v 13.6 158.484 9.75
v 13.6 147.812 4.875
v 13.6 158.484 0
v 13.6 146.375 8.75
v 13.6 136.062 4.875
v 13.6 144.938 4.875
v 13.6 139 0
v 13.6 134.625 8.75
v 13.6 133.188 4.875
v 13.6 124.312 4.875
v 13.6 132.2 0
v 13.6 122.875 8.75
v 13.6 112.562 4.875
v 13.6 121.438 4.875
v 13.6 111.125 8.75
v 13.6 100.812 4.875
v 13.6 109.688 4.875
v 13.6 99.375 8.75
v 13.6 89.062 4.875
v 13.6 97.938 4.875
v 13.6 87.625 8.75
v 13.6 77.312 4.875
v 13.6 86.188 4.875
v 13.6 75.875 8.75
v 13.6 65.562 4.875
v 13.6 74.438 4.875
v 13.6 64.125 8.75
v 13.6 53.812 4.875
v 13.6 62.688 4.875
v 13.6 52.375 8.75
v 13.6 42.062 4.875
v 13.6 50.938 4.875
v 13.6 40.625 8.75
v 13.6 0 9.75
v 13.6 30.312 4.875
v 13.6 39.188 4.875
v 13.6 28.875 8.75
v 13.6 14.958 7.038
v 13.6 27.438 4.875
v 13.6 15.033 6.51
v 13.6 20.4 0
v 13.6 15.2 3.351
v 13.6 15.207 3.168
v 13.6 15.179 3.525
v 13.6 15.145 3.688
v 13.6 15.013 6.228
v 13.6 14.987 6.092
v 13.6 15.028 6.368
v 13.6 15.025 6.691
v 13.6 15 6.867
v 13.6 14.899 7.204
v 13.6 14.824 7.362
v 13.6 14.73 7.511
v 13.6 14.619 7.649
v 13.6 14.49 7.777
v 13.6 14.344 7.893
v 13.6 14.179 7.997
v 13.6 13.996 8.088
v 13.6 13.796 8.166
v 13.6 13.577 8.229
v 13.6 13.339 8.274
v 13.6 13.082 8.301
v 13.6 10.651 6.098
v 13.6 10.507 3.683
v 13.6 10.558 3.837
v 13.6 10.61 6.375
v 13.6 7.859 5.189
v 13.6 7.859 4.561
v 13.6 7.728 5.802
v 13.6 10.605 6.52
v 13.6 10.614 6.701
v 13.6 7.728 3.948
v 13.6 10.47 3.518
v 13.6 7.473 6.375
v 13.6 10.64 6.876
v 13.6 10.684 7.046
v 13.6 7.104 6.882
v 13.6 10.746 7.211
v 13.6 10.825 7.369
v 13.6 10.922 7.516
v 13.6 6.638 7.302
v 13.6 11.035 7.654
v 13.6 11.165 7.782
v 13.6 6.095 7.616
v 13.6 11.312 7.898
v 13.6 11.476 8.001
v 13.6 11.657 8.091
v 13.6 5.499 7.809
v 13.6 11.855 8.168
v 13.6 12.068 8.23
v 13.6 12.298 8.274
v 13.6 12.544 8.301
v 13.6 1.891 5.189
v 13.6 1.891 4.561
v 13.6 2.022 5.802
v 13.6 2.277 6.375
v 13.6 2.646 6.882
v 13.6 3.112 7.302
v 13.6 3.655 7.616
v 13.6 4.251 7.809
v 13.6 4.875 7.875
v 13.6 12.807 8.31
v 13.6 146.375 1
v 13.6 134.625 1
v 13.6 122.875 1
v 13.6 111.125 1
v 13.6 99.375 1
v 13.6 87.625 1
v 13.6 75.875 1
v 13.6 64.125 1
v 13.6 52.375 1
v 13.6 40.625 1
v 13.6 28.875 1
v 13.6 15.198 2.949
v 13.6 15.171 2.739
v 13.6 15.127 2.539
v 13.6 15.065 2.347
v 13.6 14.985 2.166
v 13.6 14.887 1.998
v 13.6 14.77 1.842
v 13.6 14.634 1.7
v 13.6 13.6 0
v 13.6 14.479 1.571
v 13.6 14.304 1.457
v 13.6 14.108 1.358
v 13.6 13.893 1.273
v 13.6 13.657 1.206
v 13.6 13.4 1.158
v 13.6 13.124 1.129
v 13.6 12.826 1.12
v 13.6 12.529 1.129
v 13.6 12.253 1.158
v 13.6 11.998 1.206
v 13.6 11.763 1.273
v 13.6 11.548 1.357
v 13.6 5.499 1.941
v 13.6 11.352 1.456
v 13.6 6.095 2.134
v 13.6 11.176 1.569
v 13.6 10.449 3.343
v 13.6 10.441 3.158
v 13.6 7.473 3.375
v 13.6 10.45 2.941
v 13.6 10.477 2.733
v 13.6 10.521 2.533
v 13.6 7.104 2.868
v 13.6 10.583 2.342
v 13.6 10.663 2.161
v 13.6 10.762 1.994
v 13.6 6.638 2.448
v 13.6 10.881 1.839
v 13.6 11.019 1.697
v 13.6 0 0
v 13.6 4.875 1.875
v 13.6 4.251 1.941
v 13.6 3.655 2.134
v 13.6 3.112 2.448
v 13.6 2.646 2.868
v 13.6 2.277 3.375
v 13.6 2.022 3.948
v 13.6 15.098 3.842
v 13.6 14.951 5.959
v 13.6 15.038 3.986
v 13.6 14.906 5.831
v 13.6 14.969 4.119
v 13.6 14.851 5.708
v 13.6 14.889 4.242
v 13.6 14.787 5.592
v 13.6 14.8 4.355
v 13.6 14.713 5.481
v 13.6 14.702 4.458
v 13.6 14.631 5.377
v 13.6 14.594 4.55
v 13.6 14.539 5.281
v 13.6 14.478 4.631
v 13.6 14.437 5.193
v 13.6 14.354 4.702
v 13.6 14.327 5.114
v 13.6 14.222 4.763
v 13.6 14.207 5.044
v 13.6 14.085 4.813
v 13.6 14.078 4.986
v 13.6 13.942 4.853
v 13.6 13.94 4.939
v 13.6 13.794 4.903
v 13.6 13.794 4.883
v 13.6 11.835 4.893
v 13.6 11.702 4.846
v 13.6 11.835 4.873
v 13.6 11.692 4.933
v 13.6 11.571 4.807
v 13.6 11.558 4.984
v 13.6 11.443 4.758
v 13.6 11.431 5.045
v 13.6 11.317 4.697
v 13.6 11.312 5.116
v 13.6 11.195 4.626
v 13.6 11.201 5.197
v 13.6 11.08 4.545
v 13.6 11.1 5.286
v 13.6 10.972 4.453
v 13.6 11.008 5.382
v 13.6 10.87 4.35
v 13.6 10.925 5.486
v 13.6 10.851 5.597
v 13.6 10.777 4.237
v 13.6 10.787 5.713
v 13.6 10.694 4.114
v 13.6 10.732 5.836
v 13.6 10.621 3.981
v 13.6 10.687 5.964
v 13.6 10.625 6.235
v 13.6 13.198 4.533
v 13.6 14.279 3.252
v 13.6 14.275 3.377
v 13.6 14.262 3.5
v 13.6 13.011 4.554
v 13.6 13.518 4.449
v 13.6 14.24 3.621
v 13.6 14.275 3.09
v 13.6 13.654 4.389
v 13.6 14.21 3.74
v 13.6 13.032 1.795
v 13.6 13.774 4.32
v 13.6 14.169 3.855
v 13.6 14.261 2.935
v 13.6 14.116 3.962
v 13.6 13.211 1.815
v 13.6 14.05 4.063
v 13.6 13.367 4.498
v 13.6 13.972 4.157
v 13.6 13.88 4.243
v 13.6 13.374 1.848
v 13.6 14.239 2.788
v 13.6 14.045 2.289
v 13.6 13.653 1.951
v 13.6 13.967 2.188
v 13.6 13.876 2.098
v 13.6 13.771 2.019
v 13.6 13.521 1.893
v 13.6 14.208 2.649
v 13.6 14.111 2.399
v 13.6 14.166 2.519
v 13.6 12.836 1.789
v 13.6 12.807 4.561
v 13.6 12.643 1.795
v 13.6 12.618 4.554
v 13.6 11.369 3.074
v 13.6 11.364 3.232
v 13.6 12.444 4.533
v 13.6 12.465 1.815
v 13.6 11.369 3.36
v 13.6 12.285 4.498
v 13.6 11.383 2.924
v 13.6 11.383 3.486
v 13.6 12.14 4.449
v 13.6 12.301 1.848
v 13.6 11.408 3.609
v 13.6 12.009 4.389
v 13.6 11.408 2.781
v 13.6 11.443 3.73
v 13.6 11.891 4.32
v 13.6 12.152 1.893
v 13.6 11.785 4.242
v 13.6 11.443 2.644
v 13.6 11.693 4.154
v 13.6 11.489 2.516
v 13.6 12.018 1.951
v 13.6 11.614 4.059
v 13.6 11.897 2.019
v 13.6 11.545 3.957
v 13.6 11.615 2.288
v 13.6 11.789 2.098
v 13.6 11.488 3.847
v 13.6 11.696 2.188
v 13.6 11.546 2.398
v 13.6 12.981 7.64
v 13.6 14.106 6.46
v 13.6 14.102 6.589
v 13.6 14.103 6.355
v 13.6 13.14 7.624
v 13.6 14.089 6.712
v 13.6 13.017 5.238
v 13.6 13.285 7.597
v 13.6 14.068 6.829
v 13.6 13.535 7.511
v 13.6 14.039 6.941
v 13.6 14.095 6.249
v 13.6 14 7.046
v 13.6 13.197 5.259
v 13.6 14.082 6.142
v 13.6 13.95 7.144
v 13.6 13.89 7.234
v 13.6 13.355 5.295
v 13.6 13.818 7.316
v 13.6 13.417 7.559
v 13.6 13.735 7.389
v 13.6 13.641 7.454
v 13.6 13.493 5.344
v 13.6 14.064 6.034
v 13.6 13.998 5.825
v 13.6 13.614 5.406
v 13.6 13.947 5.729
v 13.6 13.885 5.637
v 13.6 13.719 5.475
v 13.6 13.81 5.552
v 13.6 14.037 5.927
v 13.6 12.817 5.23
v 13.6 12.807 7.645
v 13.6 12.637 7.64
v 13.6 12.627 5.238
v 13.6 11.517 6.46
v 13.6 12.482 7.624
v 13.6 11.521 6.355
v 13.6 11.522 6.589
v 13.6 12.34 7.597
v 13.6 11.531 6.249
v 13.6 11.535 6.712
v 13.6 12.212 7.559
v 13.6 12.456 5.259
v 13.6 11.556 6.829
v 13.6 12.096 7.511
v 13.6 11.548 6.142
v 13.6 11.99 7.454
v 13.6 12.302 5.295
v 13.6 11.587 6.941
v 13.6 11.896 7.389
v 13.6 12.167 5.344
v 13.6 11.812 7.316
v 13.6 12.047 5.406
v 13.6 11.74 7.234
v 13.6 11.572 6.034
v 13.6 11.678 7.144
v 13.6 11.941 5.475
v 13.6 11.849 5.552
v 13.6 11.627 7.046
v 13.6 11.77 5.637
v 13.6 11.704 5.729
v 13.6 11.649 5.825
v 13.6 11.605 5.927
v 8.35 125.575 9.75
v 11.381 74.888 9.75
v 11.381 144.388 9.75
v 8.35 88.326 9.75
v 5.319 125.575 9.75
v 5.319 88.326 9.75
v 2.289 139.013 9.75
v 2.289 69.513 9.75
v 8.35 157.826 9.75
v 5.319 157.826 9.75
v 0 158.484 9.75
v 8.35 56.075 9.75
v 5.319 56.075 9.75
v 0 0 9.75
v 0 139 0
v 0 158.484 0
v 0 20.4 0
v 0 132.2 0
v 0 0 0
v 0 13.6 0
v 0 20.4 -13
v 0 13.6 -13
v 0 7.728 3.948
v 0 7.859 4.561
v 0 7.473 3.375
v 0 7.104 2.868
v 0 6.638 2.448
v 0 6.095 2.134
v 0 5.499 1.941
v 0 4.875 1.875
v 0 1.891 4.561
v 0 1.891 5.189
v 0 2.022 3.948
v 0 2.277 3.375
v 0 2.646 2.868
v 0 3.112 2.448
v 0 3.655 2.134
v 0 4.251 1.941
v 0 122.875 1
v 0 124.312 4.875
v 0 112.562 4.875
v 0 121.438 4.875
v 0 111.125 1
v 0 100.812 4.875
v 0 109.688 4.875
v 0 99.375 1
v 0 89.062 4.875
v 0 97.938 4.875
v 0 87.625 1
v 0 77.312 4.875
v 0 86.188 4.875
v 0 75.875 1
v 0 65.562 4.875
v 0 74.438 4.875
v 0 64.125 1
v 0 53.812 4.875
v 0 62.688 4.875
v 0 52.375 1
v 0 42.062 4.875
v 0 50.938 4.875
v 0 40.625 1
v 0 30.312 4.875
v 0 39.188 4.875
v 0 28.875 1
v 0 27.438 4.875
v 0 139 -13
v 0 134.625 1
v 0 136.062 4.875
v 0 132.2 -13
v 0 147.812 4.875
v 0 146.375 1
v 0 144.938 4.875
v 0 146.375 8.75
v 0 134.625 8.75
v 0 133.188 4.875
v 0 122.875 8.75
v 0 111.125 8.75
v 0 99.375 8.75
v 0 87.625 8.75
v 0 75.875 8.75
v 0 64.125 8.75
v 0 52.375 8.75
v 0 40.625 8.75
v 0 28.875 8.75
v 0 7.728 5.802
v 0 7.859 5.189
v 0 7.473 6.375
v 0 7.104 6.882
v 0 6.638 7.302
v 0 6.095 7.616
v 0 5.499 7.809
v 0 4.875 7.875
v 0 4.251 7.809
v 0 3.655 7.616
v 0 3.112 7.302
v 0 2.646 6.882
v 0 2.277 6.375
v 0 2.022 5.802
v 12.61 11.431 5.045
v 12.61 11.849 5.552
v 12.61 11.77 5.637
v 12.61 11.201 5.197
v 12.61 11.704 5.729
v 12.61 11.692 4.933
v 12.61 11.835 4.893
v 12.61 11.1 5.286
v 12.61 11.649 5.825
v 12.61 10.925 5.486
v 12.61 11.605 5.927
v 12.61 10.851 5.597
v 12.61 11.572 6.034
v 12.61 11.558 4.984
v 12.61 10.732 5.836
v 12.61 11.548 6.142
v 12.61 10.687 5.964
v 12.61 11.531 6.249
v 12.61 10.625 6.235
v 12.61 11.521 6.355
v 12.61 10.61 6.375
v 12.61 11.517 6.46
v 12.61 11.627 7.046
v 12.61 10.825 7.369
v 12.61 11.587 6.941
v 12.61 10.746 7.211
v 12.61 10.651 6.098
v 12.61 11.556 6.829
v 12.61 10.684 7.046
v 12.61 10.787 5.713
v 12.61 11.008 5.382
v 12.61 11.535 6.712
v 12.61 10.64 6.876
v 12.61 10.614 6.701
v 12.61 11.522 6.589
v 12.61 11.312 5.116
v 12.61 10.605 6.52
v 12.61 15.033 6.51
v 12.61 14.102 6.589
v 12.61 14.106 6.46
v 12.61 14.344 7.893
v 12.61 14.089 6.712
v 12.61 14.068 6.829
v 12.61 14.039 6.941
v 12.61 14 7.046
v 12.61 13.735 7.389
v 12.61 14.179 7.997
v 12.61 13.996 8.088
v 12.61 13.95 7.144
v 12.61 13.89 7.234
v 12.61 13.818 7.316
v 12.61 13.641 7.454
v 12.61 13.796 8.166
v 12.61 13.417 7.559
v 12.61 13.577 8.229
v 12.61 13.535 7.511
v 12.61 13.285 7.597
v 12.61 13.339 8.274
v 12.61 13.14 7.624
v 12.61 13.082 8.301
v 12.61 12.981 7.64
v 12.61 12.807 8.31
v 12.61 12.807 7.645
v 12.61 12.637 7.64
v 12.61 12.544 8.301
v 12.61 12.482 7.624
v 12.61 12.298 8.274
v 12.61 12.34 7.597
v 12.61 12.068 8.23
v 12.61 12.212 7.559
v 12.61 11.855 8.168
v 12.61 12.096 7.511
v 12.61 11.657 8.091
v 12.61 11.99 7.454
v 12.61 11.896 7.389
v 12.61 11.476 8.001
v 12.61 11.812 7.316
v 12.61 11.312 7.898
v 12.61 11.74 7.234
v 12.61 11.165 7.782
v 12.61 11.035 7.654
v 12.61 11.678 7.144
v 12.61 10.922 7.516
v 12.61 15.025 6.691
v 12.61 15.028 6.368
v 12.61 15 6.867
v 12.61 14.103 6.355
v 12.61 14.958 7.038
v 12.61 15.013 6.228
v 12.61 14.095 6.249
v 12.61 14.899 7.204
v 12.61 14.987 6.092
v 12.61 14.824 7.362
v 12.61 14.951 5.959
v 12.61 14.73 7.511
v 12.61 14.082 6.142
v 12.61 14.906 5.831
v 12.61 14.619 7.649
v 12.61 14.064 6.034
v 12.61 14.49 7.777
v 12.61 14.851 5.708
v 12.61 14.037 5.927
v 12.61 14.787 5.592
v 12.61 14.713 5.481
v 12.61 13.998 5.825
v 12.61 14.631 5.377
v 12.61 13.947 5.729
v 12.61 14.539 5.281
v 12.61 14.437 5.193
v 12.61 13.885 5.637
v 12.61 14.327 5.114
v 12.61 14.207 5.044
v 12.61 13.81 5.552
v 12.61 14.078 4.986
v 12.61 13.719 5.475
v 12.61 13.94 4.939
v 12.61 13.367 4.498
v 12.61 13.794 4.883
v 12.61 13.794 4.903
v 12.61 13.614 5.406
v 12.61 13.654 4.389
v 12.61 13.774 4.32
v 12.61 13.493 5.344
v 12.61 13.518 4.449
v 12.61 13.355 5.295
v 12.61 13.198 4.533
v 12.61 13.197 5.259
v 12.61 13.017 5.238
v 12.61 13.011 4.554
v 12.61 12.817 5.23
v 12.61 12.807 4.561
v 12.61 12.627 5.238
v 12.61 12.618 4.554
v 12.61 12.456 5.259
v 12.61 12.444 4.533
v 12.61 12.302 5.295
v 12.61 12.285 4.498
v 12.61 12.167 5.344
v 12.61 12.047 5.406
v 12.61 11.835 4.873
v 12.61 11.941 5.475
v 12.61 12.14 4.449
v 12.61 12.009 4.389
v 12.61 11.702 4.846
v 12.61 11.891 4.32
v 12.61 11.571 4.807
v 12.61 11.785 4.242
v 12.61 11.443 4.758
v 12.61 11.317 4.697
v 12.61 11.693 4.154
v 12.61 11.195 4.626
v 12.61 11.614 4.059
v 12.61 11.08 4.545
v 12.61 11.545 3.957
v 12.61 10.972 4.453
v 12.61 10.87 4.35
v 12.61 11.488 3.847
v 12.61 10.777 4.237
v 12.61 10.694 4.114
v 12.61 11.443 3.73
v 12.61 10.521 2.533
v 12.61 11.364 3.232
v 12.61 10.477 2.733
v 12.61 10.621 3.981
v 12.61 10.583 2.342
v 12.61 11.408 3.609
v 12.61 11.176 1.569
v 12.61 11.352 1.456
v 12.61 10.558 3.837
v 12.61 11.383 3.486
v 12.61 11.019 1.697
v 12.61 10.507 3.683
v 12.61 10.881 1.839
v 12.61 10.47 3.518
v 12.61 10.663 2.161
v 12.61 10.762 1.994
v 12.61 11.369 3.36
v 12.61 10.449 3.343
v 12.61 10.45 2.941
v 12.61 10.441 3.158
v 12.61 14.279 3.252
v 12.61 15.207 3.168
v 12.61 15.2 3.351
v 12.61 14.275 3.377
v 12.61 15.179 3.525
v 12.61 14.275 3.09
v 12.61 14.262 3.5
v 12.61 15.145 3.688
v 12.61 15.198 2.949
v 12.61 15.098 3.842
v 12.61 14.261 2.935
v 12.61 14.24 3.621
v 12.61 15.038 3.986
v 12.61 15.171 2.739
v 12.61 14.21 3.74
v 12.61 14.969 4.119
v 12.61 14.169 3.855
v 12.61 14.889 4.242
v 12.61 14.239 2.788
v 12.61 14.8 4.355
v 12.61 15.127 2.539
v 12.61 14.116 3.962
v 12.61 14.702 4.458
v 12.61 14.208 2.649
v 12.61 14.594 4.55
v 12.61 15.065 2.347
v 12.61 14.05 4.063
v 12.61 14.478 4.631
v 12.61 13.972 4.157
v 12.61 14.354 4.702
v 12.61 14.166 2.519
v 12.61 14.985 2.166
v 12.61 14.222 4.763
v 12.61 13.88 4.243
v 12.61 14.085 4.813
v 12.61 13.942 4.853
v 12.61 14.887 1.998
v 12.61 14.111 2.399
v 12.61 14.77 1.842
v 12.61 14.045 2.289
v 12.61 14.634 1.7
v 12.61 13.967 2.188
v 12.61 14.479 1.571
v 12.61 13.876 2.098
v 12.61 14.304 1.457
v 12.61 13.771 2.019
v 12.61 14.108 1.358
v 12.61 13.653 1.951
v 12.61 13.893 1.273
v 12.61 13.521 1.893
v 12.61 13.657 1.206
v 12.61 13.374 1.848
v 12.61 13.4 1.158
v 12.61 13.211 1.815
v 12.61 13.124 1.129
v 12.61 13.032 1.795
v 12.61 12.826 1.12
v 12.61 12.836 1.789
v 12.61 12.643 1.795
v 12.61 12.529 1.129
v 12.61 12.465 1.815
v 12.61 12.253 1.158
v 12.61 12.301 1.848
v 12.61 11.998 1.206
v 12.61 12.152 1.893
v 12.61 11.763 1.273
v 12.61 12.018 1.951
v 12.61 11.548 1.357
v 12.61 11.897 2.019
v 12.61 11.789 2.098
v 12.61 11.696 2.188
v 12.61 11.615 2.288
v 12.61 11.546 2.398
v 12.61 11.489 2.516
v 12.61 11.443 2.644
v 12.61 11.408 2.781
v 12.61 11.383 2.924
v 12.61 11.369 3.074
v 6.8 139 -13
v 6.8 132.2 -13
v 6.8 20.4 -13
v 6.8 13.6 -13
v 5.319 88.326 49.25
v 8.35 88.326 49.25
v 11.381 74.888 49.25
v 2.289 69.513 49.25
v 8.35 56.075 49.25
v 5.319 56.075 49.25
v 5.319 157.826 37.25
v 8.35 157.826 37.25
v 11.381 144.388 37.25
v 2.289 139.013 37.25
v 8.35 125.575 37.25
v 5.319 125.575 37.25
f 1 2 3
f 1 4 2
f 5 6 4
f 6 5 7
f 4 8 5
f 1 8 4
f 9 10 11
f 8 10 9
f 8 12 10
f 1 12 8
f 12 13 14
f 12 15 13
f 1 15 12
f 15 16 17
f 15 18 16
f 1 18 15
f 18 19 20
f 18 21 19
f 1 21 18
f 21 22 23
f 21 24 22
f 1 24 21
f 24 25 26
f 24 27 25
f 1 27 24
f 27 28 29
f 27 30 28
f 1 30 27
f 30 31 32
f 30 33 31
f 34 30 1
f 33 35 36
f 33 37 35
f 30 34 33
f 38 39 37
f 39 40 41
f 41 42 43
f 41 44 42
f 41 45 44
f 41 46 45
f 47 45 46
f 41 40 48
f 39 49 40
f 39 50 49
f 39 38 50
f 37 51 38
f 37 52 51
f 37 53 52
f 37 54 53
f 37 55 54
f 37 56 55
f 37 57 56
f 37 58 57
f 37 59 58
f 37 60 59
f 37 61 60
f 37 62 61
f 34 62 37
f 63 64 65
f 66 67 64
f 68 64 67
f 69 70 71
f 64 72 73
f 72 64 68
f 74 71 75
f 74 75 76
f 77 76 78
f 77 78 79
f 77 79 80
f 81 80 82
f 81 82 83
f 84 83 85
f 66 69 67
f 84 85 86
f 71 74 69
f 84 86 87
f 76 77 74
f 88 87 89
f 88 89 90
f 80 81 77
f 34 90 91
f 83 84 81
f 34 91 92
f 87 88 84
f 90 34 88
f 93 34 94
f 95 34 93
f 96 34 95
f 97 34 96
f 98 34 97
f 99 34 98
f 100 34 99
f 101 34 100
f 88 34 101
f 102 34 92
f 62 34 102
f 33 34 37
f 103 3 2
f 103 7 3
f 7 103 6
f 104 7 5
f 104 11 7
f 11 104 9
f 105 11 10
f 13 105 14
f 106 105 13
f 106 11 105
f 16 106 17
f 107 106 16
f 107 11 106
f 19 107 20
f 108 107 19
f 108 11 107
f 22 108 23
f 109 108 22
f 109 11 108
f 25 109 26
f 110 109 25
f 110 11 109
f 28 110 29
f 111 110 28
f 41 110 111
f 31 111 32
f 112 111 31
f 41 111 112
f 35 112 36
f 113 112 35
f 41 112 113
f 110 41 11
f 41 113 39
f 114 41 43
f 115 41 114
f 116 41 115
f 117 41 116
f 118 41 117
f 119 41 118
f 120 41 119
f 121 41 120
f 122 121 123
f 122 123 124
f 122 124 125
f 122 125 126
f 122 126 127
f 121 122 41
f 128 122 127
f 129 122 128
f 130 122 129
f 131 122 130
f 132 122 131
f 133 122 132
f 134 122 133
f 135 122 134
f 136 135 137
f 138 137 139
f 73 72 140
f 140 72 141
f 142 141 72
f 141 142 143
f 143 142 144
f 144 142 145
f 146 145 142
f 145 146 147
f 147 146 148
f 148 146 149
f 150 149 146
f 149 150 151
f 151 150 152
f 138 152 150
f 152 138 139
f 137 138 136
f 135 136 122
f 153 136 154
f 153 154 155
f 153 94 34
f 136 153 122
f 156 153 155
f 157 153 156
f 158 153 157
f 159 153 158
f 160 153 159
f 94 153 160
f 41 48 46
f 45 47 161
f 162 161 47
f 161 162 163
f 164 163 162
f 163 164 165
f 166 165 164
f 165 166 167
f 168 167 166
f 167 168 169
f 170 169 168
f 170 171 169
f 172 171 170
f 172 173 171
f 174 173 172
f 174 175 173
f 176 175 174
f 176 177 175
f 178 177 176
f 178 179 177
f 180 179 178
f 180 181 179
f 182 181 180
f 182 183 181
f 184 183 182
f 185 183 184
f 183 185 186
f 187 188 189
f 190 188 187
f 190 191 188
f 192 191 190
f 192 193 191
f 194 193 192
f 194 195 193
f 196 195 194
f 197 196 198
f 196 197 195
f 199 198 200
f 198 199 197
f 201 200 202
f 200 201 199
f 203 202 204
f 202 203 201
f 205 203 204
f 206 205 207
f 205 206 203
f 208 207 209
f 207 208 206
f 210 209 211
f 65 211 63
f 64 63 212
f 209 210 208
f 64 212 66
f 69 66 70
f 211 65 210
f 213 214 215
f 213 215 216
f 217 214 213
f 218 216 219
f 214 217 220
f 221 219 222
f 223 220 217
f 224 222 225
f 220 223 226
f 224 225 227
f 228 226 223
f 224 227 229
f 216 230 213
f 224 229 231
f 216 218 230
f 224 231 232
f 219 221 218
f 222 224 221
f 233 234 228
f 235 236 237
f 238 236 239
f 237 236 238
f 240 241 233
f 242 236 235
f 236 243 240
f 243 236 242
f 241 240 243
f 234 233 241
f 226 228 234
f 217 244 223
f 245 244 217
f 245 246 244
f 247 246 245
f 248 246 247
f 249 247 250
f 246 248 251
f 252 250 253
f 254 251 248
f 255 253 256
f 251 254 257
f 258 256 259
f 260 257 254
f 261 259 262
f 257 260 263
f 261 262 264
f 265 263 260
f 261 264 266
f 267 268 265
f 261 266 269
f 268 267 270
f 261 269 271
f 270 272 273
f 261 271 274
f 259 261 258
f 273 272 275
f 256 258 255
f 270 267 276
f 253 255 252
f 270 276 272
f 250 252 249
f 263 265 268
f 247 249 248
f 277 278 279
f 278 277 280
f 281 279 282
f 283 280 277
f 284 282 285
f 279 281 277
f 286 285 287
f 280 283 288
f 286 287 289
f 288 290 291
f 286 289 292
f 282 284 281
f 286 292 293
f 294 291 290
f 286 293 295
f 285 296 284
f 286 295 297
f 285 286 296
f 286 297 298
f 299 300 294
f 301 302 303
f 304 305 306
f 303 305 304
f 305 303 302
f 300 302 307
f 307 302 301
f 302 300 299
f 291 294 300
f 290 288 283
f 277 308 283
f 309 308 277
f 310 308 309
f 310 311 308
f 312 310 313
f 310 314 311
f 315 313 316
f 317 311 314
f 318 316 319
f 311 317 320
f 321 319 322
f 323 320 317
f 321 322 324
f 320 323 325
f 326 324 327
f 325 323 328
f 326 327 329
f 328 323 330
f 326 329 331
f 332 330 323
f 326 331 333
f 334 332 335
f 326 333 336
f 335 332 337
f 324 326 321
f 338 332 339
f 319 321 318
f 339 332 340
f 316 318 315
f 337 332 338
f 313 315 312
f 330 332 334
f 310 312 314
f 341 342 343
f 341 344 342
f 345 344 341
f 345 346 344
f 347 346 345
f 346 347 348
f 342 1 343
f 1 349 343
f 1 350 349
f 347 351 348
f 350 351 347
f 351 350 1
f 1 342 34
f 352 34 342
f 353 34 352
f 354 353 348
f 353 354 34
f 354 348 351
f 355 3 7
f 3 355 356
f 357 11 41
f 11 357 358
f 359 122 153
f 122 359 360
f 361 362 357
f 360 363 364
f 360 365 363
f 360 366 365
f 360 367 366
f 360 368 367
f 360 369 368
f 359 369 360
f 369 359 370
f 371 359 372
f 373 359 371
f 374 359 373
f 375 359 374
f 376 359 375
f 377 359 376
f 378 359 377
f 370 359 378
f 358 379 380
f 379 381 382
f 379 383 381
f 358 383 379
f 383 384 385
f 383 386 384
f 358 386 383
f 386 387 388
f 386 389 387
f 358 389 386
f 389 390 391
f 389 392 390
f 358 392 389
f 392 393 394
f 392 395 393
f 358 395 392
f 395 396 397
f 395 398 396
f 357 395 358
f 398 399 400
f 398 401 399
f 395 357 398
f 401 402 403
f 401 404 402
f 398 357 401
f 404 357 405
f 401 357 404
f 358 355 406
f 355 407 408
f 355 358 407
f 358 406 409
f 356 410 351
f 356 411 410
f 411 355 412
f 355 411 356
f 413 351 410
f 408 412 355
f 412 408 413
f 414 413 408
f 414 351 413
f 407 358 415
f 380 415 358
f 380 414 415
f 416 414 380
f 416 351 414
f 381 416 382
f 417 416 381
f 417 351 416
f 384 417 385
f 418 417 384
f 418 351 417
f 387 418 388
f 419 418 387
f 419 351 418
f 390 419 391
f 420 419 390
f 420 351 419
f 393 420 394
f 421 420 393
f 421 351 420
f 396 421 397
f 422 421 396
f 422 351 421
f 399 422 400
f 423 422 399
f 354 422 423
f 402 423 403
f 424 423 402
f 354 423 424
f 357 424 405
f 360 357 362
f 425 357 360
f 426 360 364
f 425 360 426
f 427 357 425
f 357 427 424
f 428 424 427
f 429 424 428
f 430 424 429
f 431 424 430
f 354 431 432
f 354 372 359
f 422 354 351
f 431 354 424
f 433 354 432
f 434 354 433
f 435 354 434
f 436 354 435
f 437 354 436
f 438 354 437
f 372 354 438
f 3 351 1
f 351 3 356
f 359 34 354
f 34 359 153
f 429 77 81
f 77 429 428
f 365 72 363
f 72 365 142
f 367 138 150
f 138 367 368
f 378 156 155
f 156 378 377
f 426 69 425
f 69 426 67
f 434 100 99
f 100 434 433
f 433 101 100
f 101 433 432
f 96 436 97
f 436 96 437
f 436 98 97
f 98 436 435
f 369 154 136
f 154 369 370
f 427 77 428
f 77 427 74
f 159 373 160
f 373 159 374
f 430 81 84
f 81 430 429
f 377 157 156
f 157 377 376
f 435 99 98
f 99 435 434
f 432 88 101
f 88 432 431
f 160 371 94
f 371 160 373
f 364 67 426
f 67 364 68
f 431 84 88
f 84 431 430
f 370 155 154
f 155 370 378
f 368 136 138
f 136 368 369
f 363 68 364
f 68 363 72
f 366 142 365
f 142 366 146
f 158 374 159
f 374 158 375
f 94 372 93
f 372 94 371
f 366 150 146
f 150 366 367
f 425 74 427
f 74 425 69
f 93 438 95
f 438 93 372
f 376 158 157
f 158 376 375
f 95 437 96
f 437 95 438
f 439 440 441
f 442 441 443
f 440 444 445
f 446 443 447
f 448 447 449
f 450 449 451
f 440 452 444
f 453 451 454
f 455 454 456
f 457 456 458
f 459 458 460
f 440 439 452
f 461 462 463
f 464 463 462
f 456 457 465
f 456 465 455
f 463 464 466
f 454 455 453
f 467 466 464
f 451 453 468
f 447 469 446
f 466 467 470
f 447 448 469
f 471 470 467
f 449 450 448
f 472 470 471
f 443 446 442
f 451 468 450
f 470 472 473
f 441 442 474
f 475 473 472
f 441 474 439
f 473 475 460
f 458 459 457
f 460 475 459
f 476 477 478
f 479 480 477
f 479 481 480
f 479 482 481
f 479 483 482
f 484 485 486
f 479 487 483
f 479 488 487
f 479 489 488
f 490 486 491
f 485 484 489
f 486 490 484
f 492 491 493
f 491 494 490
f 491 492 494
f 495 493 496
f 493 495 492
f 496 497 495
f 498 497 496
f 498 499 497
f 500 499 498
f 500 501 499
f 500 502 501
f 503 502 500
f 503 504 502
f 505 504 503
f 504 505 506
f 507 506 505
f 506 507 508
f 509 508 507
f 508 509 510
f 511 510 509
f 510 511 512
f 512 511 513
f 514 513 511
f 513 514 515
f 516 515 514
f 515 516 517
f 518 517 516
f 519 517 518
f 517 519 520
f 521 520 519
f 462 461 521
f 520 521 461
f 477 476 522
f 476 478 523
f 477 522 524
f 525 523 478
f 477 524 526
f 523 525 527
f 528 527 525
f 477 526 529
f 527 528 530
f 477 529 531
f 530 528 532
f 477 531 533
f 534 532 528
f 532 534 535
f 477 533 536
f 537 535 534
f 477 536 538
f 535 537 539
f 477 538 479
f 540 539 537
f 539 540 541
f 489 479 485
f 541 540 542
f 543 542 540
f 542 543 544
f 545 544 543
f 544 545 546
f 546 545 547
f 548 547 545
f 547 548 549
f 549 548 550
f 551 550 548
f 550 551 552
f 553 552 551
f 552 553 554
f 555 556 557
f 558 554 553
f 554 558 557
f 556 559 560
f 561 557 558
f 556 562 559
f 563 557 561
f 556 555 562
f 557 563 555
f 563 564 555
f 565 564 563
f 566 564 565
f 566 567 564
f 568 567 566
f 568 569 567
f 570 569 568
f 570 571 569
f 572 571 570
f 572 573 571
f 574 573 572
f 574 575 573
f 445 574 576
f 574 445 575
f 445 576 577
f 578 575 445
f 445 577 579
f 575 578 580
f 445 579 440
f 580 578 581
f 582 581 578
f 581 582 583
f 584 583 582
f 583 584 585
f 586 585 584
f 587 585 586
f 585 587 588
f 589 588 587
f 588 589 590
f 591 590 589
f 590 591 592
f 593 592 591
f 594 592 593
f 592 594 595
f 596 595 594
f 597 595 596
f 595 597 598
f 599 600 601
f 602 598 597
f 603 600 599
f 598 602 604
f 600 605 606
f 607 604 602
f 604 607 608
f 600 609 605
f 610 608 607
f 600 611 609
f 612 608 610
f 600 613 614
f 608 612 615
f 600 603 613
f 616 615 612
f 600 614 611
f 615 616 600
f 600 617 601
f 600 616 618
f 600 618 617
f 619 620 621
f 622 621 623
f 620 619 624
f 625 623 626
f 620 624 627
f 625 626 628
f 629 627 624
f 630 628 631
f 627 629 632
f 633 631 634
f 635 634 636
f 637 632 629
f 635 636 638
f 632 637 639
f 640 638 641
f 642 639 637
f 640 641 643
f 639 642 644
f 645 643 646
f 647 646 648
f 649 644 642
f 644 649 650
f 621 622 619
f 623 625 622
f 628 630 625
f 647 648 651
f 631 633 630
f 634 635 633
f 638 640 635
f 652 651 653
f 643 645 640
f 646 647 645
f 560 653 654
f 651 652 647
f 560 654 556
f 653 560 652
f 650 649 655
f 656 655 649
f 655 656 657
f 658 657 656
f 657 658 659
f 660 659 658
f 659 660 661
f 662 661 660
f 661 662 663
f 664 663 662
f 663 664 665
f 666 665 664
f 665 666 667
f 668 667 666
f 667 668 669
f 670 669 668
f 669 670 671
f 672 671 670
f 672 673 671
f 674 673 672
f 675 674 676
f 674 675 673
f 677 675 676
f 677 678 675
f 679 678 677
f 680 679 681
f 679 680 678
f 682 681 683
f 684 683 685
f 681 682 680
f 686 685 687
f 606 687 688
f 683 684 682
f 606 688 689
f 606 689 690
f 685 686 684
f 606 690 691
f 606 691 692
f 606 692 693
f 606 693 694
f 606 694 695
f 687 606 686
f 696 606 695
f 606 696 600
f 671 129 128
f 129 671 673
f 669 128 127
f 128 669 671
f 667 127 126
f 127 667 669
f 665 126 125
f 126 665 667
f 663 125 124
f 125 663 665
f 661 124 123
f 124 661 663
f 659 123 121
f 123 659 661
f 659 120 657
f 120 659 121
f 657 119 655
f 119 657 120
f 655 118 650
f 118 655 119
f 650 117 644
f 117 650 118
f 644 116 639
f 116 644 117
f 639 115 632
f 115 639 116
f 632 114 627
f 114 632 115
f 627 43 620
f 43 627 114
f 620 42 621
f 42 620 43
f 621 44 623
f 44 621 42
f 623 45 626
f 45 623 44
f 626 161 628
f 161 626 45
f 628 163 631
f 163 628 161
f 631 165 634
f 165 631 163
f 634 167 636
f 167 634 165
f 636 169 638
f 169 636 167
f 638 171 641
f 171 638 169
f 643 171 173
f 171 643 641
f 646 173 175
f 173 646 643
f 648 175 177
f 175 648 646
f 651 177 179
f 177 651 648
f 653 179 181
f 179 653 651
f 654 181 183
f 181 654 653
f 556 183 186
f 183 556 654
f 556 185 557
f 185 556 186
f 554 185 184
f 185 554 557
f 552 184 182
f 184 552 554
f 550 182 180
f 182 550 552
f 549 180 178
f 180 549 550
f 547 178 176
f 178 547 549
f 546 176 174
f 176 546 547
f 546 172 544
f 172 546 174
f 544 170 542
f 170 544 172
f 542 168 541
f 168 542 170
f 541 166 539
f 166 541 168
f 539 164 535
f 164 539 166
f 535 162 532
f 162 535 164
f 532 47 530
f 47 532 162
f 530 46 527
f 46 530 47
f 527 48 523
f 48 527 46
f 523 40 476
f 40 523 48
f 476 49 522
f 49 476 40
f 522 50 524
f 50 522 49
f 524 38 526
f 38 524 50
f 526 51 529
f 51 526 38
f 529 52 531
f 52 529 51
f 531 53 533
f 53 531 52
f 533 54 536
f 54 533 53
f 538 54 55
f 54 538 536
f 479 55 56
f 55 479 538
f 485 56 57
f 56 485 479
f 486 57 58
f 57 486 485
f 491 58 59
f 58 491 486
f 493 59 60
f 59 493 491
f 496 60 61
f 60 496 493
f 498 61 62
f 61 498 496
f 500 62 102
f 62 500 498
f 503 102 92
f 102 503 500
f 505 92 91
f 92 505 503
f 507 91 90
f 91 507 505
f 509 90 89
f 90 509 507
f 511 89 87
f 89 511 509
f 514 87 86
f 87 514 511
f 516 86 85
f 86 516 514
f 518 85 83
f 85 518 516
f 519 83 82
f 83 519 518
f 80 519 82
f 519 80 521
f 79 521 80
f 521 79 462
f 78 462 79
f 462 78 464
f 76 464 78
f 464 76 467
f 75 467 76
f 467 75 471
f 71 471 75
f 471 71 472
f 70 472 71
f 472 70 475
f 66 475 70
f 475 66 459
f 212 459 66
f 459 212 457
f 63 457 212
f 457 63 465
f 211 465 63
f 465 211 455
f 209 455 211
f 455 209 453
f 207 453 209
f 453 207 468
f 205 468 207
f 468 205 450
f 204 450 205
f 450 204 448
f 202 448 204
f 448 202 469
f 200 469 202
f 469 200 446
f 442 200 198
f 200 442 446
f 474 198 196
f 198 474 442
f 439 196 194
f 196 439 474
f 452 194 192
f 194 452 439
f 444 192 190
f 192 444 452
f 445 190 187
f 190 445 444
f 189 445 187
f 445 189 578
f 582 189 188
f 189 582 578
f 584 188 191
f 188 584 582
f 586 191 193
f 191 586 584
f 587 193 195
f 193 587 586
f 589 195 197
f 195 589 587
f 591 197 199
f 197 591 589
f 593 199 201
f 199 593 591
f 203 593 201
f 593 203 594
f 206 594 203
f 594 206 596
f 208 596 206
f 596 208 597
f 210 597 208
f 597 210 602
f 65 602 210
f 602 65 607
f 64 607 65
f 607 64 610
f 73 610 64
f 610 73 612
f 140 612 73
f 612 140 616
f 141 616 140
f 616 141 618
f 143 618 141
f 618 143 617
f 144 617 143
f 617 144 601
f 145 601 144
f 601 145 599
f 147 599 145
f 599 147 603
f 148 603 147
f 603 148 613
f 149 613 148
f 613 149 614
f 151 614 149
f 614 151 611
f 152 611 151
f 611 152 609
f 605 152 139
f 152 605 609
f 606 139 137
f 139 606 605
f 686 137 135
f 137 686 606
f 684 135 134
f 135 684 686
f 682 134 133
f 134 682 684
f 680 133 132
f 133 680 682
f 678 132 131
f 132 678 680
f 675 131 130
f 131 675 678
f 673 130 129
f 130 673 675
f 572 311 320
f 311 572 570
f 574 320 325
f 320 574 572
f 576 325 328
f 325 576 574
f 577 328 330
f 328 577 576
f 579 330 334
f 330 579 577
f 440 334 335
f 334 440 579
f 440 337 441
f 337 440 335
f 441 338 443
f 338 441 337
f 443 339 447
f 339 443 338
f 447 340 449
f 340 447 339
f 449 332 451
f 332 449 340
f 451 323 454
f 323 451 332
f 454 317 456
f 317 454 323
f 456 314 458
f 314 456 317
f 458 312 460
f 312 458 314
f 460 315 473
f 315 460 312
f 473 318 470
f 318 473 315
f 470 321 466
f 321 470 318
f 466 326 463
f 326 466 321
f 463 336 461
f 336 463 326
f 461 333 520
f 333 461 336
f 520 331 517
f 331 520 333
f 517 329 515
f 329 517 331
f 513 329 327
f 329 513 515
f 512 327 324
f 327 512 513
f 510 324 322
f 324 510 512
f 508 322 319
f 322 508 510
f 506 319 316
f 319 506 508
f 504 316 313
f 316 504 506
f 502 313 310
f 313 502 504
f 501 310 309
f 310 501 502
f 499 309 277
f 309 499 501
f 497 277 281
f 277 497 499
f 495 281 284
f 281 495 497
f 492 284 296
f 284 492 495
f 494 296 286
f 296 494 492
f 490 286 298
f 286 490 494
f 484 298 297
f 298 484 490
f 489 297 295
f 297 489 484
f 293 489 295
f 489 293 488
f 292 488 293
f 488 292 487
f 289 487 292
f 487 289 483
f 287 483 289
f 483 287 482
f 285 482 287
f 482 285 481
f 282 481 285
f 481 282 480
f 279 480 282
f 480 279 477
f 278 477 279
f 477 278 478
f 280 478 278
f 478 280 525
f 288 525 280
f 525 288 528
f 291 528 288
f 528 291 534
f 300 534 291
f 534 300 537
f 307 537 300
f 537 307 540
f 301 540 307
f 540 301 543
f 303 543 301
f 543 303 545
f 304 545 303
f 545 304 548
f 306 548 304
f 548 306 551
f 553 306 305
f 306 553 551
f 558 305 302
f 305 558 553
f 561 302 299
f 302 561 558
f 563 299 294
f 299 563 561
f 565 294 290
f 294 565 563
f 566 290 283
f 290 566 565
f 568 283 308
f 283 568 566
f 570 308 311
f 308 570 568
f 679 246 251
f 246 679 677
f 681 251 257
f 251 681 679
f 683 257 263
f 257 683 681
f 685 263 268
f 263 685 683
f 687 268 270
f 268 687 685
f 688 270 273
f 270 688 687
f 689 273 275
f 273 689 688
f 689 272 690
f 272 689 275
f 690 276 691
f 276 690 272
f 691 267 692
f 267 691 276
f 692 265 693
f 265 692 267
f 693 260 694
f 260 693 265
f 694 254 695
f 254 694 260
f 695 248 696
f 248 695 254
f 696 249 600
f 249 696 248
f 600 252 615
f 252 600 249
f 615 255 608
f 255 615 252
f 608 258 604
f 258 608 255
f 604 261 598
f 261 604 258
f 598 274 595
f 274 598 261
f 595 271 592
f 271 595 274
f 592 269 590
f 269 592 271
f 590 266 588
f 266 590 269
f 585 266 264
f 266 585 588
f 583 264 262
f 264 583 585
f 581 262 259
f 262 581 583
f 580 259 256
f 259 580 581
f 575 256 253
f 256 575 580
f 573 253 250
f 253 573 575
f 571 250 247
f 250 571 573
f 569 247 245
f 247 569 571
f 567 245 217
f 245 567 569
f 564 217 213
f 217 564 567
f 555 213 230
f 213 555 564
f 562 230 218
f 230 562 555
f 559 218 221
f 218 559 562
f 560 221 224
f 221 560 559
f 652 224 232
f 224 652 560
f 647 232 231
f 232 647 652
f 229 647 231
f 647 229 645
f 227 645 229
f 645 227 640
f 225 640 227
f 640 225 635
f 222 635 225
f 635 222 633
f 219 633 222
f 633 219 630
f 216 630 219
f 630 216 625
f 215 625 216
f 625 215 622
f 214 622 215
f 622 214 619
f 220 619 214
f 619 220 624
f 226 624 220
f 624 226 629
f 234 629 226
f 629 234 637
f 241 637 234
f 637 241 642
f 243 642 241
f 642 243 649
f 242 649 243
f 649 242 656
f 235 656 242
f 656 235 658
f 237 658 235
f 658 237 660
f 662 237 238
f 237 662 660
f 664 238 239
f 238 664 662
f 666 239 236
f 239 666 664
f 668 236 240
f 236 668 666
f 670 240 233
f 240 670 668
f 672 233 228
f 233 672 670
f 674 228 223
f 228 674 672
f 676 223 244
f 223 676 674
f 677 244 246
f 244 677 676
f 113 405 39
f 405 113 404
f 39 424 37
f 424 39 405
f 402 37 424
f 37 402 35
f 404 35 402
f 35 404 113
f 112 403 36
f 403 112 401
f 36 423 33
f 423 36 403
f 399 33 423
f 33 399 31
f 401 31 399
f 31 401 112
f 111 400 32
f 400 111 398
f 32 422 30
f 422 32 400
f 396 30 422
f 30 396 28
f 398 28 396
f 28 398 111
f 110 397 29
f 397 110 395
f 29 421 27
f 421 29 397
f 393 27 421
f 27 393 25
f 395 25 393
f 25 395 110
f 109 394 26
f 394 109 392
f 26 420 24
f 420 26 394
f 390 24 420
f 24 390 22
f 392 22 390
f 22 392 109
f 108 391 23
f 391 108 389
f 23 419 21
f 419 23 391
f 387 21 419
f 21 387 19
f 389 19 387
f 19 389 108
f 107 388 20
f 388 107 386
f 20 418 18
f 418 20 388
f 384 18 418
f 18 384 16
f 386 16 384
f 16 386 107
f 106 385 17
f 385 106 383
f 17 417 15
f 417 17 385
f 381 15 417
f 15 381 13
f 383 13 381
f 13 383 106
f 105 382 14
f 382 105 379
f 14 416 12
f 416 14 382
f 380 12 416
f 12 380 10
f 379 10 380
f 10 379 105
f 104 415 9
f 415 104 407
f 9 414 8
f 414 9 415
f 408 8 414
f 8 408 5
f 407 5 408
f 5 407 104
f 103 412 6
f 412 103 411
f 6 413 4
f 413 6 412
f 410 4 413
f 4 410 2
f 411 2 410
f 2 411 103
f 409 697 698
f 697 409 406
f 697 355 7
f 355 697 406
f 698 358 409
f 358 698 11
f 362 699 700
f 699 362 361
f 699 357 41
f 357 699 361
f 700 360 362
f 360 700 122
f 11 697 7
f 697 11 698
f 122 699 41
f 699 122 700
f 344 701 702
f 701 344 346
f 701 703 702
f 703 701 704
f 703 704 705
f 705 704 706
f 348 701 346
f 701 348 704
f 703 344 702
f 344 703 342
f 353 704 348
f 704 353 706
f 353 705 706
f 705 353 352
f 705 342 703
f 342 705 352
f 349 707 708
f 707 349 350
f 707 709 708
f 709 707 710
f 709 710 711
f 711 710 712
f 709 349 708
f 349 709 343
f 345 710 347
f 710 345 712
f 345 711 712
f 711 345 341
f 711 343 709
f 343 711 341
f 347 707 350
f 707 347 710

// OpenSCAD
// file: values.scad
$fs=0.1;
//Constants:
edgeRadius=1.5;
underKeyWidth=13.6;
baseHeight=9.75;
genh=5.791666666666667;
a=27.423996629776394;
b=12.370392724366756;
c=12.370392724366756;
d=38.393595281686956;
overhead=65.81759191146335;
keyTravelDistance=13.0;
desiredGamut=24;
shift=3.092598181091689;
holeScale=0.5;
stalkScale=0.48;

Points = [
[shift,a,0],//0
[(b-shift),0,0],//1
[(b+shift),0,0],//2
[(b+c-shift),d,0],//3
[(c+shift),(a+d),0],//4
[(c-shift),(a+d),0],//5
[shift,a,keyTravelDistance],//6
[(b-shift),0,keyTravelDistance],//7
[(b+shift),0,keyTravelDistance],//8
[(b+c-shift),d,keyTravelDistance],//9
[(c+shift),(a+d),keyTravelDistance],//10
[(c-shift),(a+d),keyTravelDistance],//11
];
Faces = [
[0,1,2,3,4,5],
[1,0,6,7],
[2,1,7,8],
[3,2,8,9],
[4,3,9,10],
[5,4,10,11],
[0,5,11,6],
[11,10,9,8,7,6] 
];
// file: keytop.scad
include<values.scad>;
keytop();

module keytopShape(){
polyhedron(Points,Faces);
}
module keytop(){
difference(){
keytopShape();
translate([(b+c)/4,(d+a)/4,-0.1])
scale(holeScale,holeScale,holeScale)
keytopShape();
edge(6,11,1,-1);
edge(6,7,1,1);
edge(7,8,1,1);
edge(8,9,1,1);
edge(9,10,1,-1,-1);
edge(10,11,1,-1);
}
module edge (point1,point2,d1,d2,d3=1){
difference(){
translate([Points[point1][0],Points[point1][1],Points[point1][2]])
rotate([0,90,atan((Points[point2][1]-Points[point1][1])/(Points[point2][0]-Points[point1][0]))])
translate([0,0,d3*30])
rotate(45,0,0)
cube([pow(2*(edgeRadius*edgeRadius),1/2),pow(2*(edgeRadius*edgeRadius),1/2),90],true);
translate([Points[point1][0],Points[point1][1],Points[point1][2]])
rotate([0,90,atan((Points[point2][1]-Points[point1][1])/(Points[point2][0]-Points[point1][0]))])
translate([d1*edgeRadius,d2*edgeRadius,d3*30])
cylinder(90,edgeRadius,edgeRadius, true);
}
}

}
// main file
use<keytop.scad>
include<values.scad>
rotate([0,90,0])8_4();
module 8_4(keytops=false){
length=158.48425857813004;
rotate([0,-90,0]){
//Main Base:
difference(){
cube([underKeyWidth,length,baseHeight],false);
translate([-.1,0.5*baseHeight,0.5*baseHeight])rotate([0,90,0])
cylinder((underKeyWidth+.2),r=3, false);
translate([underKeyWidth-.99,10,0.125*baseHeight])
rotate([90,0,90])
linear_extrude(height=1){
text("8",size=baseHeight*0.75);
}

//Warp Cuts:
translate([-1,0.0+25+0.25*baseHeight,baseHeight-1])
rotate([0,90,0])
linear_extrude(height=underKeyWidth+2)
polygon(points=[[0.5*baseHeight-1,0],[baseHeight-2,0.25*baseHeight-1],[0.5*baseHeight-1,0.5*baseHeight-2],[0,0.25*baseHeight-1]]);
translate([-1,11.75+25+0.25*baseHeight,baseHeight-1])
rotate([0,90,0])
linear_extrude(height=underKeyWidth+2)
polygon(points=[[0.5*baseHeight-1,0],[baseHeight-2,0.25*baseHeight-1],[0.5*baseHeight-1,0.5*baseHeight-2],[0,0.25*baseHeight-1]]);
translate([-1,23.5+25+0.25*baseHeight,baseHeight-1])
rotate([0,90,0])
linear_extrude(height=underKeyWidth+2)
polygon(points=[[0.5*baseHeight-1,0],[baseHeight-2,0.25*baseHeight-1],[0.5*baseHeight-1,0.5*baseHeight-2],[0,0.25*baseHeight-1]]);
translate([-1,35.25+25+0.25*baseHeight,baseHeight-1])
rotate([0,90,0])
linear_extrude(height=underKeyWidth+2)
polygon(points=[[0.5*baseHeight-1,0],[baseHeight-2,0.25*baseHeight-1],[0.5*baseHeight-1,0.5*baseHeight-2],[0,0.25*baseHeight-1]]);
translate([-1,47.0+25+0.25*baseHeight,baseHeight-1])
rotate([0,90,0])
linear_extrude(height=underKeyWidth+2)
polygon(points=[[0.5*baseHeight-1,0],[baseHeight-2,0.25*baseHeight-1],[0.5*baseHeight-1,0.5*baseHeight-2],[0,0.25*baseHeight-1]]);
translate([-1,58.75+25+0.25*baseHeight,baseHeight-1])
rotate([0,90,0])
linear_extrude(height=underKeyWidth+2)
polygon(points=[[0.5*baseHeight-1,0],[baseHeight-2,0.25*baseHeight-1],[0.5*baseHeight-1,0.5*baseHeight-2],[0,0.25*baseHeight-1]]);
translate([-1,70.5+25+0.25*baseHeight,baseHeight-1])
rotate([0,90,0])
linear_extrude(height=underKeyWidth+2)
polygon(points=[[0.5*baseHeight-1,0],[baseHeight-2,0.25*baseHeight-1],[0.5*baseHeight-1,0.5*baseHeight-2],[0,0.25*baseHeight-1]]);
translate([-1,82.25+25+0.25*baseHeight,baseHeight-1])
rotate([0,90,0])
linear_extrude(height=underKeyWidth+2)
polygon(points=[[0.5*baseHeight-1,0],[baseHeight-2,0.25*baseHeight-1],[0.5*baseHeight-1,0.5*baseHeight-2],[0,0.25*baseHeight-1]]);
translate([-1,94.0+25+0.25*baseHeight,baseHeight-1])
rotate([0,90,0])
linear_extrude(height=underKeyWidth+2)
polygon(points=[[0.5*baseHeight-1,0],[baseHeight-2,0.25*baseHeight-1],[0.5*baseHeight-1,0.5*baseHeight-2],[0,0.25*baseHeight-1]]);
translate([-1,105.75+25+0.25*baseHeight,baseHeight-1])
rotate([0,90,0])
linear_extrude(height=underKeyWidth+2)
polygon(points=[[0.5*baseHeight-1,0],[baseHeight-2,0.25*baseHeight-1],[0.5*baseHeight-1,0.5*baseHeight-2],[0,0.25*baseHeight-1]]);
translate([-1,117.5+25+0.25*baseHeight,baseHeight-1])
rotate([0,90,0])
linear_extrude(height=underKeyWidth+2)
polygon(points=[[0.5*baseHeight-1,0],[baseHeight-2,0.25*baseHeight-1],[0.5*baseHeight-1,0.5*baseHeight-2],[0,0.25*baseHeight-1]]);
}
//Key Stalks:
translate([shift/4,(genh*4-(d+a)/2+overhead),baseHeight]){
linear_extrude(height=(keyTravelDistance*1.5+desiredGamut-4)){
scale((stalkScale+holeScale)/2,stalkScale)
polygon(points=[
[Points[0][0],Points[0][1]],[Points[1][0],Points[1][1]],[Points[2][0],Points[2][1]],[Points[3][0],Points[3][1]],[Points[4][0],Points[4][1]],[Points[5][0],Points[5][1]],[Points[6][0],Points[6][1]]
]);
}
if(keytops)
translate([0,(-0.5*(a+d)),(keyTravelDistance*1.5+desiredGamut-4+40)])
keytop();
}
translate([shift/4,(genh*16-(d+a)/2+overhead),baseHeight]){
linear_extrude(height=(keyTravelDistance*1.5+desiredGamut-16)){
scale((stalkScale+holeScale)/2,stalkScale)
polygon(points=[
[Points[0][0],Points[0][1]],[Points[1][0],Points[1][1]],[Points[2][0],Points[2][1]],[Points[3][0],Points[3][1]],[Points[4][0],Points[4][1]],[Points[5][0],Points[5][1]],[Points[6][0],Points[6][1]]
]);
}
if(keytops)
translate([0,(-0.5*(a+d)),(keyTravelDistance*1.5+desiredGamut-16+40)])
keytop();
}
//Feet:
difference(){union(){translate([0,132.2,-13.0]){
cube([13.6,6.8,13.0],false);}
translate([0,13.6,-13.0]){
cube([13.6,6.8,13.0],false);}}
translate([13.6,0.5,0])
rotate([0,27.613027823084472,0])
translate([0,0,-26.0])
cube([26.0,163.16666666666669,26.0]);
}
}}
